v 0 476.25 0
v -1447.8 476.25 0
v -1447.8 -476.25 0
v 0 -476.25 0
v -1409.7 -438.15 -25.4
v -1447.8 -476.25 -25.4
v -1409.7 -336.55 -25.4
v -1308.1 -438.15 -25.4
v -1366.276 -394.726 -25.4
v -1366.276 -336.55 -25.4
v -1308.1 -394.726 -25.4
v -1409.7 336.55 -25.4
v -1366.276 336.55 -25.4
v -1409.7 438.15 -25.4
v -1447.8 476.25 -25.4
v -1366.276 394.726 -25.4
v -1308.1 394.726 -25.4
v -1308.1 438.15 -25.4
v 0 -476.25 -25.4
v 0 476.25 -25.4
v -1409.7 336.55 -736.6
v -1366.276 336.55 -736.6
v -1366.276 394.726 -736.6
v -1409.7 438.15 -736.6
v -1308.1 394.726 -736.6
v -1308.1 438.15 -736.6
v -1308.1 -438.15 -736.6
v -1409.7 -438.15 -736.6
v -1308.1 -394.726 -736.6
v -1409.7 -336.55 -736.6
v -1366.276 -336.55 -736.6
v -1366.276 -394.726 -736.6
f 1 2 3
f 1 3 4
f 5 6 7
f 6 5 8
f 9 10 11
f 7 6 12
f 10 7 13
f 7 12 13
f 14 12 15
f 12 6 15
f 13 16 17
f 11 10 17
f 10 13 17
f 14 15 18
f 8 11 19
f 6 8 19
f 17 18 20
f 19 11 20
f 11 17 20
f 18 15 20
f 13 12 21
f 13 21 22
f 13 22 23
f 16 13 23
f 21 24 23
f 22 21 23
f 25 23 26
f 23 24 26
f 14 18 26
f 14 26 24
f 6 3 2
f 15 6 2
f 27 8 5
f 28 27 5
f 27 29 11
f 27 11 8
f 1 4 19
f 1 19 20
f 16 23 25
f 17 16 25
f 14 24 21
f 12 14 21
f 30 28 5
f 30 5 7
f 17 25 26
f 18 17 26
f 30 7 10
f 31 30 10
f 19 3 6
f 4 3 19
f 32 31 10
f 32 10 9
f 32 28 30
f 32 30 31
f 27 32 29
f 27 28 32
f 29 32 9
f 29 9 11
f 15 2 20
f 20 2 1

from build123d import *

# Parameters (mm, degrees)
F1_DEPTH = 736.6
F0_W     = 1447.8
F0_H     = 952.5
F3_DEPTH = 25.4


with BuildPart() as f1:
    # F0 (on Top) → F1 (new body)
    with BuildSketch(Plane.XY):
        Polygon((-1308.1, 438.15), (-1409.7, 438.15), (-1409.7, 336.55), (-1366.275751, 336.55), (-1366.275751, 394.725751), (-1308.1, 394.725751), align=None)
    extrude(amount=-F1_DEPTH)



with BuildPart() as f2_1:
    # F2: instance of F1
    add(f1.part.mirror(Plane.XZ))


with BuildPart() as f1_1:
    add(f1.part)

    add(f2_1.part)  # F3 merges F2_1
    # F0 (on Top) → F3 (join)
    with BuildSketch(Plane.XY):
        with Locations((-723.9, 0)):
            Rectangle(F0_W, F0_H)
        Polygon((-1409.7, 336.55), (-1409.7, 438.15), (-1308.1, 438.15), (-1308.1, 394.725751), (-1366.275751, 394.725751), (-1366.275751, 336.55), align=None, mode=Mode.SUBTRACT)
    extrude(amount=-F3_DEPTH)


solid = f1_1.part
